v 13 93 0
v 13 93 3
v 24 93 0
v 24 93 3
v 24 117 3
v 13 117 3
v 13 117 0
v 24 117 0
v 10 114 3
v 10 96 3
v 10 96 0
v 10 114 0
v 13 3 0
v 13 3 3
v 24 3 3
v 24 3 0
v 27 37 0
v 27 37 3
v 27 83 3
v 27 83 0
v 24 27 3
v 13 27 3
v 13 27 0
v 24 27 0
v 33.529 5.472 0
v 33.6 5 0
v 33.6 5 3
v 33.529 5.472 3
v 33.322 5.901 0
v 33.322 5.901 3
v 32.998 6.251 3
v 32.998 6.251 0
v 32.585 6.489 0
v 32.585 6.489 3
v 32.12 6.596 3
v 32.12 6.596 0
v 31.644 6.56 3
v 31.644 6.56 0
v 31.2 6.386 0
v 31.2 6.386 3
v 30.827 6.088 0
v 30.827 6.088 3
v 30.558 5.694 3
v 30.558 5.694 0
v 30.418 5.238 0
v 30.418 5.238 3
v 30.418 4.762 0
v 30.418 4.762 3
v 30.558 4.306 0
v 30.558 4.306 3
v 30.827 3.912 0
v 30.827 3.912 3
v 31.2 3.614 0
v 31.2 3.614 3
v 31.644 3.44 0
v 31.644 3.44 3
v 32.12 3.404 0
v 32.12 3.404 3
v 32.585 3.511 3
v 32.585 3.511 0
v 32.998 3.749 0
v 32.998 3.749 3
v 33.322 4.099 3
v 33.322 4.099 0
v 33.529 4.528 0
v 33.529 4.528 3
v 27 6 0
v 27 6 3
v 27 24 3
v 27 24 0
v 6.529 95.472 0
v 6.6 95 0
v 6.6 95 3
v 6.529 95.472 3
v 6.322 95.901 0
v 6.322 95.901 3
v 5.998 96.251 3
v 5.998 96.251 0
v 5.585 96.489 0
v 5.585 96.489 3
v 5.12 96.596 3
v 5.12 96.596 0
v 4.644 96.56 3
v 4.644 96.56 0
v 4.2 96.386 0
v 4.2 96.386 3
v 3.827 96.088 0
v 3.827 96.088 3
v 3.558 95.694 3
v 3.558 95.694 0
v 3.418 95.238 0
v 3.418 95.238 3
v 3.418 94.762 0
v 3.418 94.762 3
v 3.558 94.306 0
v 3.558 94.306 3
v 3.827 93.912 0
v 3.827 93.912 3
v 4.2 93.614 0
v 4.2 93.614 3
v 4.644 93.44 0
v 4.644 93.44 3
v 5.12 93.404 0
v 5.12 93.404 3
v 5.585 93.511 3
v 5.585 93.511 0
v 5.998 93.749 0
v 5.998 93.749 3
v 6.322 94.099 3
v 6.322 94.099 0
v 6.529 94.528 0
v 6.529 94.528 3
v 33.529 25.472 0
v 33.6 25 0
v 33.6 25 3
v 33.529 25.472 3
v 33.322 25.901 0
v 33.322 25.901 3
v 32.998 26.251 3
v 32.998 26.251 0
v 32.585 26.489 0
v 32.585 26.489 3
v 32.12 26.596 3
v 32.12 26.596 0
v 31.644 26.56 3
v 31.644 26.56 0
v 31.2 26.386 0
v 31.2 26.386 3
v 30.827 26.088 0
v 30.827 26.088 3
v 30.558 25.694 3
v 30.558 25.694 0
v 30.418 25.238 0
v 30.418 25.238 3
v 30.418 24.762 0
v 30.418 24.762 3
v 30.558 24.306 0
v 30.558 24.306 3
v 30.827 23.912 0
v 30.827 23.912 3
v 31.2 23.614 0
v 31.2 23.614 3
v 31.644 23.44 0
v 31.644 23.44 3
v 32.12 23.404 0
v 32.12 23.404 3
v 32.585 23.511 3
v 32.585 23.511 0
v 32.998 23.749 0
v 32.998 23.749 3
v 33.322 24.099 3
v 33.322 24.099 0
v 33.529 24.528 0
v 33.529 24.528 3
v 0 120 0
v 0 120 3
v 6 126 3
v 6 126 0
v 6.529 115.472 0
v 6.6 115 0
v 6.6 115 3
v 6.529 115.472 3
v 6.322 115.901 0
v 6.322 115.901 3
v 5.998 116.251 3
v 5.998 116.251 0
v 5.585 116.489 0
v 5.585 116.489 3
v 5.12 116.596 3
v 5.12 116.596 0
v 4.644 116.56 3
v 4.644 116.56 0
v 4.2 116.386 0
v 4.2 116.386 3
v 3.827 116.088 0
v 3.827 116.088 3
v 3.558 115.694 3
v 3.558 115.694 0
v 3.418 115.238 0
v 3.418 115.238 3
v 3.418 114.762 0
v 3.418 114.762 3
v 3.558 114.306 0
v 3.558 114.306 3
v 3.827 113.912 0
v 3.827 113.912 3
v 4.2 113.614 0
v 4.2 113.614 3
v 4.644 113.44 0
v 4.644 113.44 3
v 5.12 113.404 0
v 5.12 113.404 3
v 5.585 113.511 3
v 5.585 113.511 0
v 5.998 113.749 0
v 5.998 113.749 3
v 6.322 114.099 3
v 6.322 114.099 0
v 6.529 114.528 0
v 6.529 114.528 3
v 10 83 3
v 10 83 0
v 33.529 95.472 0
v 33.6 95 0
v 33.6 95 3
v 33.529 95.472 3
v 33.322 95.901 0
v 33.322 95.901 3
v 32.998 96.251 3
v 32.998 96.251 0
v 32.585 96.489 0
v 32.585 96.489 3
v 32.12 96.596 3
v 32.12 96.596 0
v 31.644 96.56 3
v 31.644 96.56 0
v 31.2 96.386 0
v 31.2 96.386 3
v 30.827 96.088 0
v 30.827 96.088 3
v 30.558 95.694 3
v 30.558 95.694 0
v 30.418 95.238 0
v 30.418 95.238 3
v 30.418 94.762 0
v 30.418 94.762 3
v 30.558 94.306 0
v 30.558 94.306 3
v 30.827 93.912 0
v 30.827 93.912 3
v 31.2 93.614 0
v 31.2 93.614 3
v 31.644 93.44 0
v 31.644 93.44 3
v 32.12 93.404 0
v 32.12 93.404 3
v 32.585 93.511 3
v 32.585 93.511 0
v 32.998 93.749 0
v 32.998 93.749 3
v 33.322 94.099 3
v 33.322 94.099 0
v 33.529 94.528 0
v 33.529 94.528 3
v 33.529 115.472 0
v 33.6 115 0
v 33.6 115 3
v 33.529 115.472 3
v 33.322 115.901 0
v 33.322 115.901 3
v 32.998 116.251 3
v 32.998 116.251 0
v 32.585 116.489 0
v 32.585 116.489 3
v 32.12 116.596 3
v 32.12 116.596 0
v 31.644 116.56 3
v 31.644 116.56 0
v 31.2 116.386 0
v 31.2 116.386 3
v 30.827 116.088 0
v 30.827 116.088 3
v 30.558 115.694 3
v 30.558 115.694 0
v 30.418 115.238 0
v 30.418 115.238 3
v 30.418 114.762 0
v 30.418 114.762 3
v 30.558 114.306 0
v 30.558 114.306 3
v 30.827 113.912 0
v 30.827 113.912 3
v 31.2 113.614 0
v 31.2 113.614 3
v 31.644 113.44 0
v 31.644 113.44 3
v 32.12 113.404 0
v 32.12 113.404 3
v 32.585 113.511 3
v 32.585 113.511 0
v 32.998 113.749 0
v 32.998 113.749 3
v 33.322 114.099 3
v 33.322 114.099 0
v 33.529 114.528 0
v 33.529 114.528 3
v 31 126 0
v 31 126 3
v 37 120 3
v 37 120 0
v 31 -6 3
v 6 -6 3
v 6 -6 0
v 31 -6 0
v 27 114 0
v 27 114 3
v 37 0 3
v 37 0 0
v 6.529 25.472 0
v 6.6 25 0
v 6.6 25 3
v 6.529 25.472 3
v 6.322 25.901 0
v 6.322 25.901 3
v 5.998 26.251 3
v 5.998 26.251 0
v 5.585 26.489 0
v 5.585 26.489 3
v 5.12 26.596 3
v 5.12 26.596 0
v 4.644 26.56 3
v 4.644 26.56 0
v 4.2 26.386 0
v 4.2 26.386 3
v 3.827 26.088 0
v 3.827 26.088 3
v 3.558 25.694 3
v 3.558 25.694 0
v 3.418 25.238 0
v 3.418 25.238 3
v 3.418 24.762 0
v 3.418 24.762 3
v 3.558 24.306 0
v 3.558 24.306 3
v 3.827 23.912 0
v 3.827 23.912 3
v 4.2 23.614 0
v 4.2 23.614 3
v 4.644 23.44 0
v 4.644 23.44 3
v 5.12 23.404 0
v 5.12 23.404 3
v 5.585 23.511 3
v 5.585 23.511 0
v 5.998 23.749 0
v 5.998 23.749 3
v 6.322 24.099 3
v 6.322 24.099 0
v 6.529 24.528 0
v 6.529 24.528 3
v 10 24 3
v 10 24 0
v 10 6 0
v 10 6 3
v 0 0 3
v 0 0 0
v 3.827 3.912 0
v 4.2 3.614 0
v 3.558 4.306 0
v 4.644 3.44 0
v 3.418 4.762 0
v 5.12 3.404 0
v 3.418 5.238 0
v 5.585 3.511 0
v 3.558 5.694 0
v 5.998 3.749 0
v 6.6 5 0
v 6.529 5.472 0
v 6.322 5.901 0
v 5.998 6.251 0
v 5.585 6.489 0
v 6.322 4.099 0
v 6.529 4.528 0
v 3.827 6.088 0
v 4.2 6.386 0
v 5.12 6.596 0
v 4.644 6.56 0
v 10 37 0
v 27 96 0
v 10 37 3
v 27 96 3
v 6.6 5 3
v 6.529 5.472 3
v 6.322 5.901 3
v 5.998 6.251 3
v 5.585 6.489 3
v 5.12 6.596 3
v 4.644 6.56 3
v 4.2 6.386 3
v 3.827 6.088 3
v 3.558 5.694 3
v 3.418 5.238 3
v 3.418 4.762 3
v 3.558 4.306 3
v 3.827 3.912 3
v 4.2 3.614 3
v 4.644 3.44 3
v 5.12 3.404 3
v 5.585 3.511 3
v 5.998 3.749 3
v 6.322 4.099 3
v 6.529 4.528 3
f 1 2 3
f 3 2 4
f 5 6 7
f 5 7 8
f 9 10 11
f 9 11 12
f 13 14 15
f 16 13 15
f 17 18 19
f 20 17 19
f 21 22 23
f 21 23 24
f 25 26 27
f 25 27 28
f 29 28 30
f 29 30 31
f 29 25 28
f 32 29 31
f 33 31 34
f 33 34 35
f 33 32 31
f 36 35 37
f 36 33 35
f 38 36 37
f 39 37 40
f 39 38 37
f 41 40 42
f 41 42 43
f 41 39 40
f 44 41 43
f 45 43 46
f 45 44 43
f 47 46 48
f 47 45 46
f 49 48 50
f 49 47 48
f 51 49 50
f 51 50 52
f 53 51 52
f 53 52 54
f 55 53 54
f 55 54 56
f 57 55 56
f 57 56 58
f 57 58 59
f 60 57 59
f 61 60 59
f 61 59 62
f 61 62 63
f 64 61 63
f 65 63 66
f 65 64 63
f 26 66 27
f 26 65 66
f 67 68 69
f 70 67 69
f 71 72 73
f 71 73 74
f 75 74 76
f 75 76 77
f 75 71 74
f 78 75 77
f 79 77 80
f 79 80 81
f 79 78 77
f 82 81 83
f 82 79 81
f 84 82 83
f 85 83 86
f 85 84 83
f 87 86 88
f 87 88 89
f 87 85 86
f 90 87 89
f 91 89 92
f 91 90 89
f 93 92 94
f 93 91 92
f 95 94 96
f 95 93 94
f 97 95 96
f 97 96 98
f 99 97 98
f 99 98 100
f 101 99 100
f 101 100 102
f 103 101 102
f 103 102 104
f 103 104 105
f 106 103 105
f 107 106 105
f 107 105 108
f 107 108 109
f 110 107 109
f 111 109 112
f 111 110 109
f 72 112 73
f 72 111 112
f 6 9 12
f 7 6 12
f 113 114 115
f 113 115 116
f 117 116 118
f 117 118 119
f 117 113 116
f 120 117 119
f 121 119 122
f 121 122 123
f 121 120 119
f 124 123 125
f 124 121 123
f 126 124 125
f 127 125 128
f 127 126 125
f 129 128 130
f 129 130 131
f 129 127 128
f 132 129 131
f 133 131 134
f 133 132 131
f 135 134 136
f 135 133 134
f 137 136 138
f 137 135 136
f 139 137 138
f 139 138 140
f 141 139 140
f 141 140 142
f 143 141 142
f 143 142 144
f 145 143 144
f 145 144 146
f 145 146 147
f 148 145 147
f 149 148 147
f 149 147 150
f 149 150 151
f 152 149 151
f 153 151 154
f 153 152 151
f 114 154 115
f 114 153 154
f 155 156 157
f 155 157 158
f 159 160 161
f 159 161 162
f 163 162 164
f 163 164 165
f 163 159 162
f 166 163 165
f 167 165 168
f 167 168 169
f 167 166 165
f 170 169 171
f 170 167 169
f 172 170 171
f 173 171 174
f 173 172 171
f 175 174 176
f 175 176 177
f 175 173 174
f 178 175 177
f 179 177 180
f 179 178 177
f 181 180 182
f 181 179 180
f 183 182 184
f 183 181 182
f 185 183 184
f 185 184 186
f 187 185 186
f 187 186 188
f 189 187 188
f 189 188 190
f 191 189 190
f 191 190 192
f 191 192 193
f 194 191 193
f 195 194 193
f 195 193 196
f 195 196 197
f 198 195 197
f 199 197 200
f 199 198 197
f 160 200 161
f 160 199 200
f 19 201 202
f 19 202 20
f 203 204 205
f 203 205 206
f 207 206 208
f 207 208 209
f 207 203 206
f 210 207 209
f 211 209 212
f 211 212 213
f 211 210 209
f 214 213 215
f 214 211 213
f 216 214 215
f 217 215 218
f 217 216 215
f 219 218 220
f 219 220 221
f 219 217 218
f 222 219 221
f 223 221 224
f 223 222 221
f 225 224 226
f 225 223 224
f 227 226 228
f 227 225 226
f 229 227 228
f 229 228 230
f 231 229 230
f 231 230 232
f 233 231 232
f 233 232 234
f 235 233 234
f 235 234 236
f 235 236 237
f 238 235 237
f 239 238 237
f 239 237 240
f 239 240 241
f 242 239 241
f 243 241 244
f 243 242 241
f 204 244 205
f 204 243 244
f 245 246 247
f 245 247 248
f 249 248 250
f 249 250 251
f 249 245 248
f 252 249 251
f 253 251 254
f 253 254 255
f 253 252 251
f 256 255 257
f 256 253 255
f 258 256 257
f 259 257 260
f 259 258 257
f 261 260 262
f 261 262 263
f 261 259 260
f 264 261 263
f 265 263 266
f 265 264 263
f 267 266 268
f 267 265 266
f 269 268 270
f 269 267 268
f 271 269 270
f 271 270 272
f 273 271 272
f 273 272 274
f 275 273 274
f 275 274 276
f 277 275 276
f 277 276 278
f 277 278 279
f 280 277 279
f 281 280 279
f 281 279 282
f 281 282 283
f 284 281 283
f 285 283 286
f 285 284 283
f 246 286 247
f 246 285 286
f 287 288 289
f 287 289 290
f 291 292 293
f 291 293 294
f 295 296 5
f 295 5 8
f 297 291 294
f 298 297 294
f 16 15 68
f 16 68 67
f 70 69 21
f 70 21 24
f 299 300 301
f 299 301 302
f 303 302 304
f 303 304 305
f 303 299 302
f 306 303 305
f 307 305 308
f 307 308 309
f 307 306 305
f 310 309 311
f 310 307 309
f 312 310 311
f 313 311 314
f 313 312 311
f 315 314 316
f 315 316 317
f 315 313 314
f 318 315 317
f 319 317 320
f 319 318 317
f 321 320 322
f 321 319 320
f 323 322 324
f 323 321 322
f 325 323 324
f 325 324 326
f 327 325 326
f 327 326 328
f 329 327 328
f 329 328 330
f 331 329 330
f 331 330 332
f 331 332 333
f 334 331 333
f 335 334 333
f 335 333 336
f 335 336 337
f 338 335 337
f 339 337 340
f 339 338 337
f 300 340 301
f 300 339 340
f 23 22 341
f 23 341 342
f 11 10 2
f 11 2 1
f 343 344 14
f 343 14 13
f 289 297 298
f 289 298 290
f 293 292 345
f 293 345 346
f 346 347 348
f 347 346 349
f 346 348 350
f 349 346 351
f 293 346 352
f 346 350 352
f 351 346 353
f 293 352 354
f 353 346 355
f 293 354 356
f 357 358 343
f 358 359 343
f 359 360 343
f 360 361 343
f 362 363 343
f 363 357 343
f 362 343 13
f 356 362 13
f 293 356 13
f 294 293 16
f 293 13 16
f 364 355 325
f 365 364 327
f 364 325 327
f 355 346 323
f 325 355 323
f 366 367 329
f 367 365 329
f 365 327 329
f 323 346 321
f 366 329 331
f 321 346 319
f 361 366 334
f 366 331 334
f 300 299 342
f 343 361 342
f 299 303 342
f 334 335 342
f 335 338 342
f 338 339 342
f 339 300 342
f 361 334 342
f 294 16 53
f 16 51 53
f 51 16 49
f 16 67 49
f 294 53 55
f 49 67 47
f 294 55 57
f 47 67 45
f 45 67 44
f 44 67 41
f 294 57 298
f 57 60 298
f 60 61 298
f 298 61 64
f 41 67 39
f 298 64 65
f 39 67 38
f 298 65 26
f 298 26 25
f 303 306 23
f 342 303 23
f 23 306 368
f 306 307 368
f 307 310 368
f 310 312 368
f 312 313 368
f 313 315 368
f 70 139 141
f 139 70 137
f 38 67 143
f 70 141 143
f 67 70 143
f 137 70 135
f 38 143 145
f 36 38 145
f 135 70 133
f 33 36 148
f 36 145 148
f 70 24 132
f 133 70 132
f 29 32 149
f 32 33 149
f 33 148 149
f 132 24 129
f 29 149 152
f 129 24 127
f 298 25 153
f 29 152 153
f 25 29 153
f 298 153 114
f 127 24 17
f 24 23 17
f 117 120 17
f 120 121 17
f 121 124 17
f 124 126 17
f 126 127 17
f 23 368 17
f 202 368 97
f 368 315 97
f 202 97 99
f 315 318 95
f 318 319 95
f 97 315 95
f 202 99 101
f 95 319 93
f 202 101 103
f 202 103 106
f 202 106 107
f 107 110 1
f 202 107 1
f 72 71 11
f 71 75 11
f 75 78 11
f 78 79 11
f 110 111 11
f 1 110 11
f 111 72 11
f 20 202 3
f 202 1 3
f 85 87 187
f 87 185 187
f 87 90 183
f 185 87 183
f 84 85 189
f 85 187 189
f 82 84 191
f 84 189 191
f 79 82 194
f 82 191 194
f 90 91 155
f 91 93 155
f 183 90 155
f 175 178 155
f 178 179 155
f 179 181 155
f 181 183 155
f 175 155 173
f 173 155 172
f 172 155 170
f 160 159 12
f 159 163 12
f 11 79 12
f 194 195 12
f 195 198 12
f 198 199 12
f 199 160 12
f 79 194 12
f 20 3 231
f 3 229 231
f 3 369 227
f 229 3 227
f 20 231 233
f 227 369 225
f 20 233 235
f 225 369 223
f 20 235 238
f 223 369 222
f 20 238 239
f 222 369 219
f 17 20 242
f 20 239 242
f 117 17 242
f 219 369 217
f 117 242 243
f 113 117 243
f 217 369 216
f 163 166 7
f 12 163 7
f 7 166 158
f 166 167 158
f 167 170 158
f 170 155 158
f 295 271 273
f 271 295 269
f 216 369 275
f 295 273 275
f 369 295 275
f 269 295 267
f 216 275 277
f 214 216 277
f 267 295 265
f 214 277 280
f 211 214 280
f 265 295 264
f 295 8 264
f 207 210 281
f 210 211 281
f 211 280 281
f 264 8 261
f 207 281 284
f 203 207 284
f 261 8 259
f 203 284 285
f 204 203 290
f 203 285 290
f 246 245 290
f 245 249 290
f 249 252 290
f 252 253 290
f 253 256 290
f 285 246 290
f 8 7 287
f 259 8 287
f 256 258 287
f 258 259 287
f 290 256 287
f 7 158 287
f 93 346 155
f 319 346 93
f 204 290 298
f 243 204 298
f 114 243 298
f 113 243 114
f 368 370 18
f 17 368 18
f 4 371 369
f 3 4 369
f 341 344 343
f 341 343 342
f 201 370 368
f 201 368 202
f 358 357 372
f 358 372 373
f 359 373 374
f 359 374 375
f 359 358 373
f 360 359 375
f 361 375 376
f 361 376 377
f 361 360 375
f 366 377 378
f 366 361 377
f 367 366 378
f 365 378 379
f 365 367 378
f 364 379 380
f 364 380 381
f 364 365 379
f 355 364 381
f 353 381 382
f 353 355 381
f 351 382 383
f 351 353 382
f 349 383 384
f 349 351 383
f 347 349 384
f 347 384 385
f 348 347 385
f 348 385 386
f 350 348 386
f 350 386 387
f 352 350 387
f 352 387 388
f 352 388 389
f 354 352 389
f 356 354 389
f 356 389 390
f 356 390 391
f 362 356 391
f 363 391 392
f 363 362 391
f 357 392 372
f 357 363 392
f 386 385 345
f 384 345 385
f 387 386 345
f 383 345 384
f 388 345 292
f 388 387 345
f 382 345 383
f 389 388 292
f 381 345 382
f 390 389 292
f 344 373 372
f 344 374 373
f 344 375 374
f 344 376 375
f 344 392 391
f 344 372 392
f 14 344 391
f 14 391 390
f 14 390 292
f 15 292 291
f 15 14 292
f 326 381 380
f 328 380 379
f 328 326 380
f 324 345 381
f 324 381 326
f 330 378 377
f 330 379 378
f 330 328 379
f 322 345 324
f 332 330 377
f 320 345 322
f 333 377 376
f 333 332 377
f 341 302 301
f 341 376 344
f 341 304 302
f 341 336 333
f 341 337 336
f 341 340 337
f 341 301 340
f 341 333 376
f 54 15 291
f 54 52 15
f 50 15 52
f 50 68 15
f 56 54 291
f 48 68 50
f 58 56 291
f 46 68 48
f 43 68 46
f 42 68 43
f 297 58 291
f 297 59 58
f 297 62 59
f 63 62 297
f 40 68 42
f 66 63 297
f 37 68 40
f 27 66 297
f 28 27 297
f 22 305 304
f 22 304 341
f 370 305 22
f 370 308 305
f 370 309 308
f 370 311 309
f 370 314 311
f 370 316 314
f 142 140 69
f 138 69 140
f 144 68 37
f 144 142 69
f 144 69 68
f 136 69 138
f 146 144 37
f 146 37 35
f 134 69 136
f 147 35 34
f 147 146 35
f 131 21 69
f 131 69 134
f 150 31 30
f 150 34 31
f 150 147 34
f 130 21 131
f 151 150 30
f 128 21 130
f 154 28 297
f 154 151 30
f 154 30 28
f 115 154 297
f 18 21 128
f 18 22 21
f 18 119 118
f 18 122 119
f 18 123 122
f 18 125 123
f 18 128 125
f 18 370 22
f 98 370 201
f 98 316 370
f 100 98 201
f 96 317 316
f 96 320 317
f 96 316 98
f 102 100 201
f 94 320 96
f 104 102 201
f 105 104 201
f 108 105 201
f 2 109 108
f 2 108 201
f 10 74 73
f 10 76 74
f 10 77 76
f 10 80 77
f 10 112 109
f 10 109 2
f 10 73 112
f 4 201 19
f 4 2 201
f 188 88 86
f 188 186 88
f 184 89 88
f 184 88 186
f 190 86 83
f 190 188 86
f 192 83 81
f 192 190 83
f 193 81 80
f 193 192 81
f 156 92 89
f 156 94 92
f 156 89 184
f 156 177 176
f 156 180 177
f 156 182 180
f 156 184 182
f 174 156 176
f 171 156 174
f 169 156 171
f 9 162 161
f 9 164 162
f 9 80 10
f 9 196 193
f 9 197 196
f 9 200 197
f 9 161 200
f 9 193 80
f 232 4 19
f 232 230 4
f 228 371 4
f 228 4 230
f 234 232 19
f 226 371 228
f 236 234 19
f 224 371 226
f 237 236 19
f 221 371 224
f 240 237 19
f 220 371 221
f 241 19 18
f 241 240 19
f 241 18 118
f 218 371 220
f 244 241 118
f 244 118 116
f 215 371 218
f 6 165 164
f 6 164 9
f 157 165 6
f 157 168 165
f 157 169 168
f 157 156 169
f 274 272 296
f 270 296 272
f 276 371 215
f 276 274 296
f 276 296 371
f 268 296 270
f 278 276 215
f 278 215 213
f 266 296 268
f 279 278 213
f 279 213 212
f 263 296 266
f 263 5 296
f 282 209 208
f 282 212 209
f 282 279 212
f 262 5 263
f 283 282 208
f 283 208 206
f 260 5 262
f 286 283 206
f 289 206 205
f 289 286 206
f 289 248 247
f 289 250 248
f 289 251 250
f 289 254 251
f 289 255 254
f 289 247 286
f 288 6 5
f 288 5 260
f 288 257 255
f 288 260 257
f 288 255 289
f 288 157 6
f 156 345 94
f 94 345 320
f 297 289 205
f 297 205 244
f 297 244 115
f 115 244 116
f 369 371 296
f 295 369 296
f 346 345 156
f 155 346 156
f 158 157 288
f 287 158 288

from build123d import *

# Parameters (mm, degrees)
SKETCH_1_W          = 37
SKETCH_1_H          = 120
SKETCH_1_R          = 1.6
EXTRUDE_1_DEPTH     = 3
SKETCH_2_W          = 17
SKETCH_2_H          = 24
CUT_EXTRUDE_1_DEPTH = 126.610509114
SKETCH_3_W          = 37
SKETCH_3_H          = 6
EXTRUDE_2_DEPTH     = 3
CHAMFER_1_SIZE      = 6
CHAMFER_2_SIZE      = 3
SKETCH_4_W          = 17
SKETCH_4_H          = 46
CUT_EXTRUDE_2_DEPTH = 10


with BuildPart() as part:
    # ｽｹｯﾁ1 → ﾎﾞｽ - 押し出し1 (new body)
    with BuildSketch(Plane.XY):
        with Locations((18.5, 60)):
            Rectangle(SKETCH_1_W, SKETCH_1_H)
        with Locations((5, 115)):
            Circle(SKETCH_1_R, mode=Mode.SUBTRACT)
        with Locations((32, 115)):
            Circle(SKETCH_1_R, mode=Mode.SUBTRACT)
        with Locations((5, 95)):
            Circle(SKETCH_1_R, mode=Mode.SUBTRACT)
        with Locations((32, 95)):
            Circle(SKETCH_1_R, mode=Mode.SUBTRACT)
        with Locations((5, 25)):
            Circle(SKETCH_1_R, mode=Mode.SUBTRACT)
        with Locations((32, 25)):
            Circle(SKETCH_1_R, mode=Mode.SUBTRACT)
        with Locations((5, 5)):
            Circle(SKETCH_1_R, mode=Mode.SUBTRACT)
        with Locations((32, 5)):
            Circle(SKETCH_1_R, mode=Mode.SUBTRACT)
    extrude(amount=EXTRUDE_1_DEPTH)

    # ｽｹｯﾁ2 → ｶｯﾄ - 押し出し1 (cut, through all)
    with BuildSketch(Plane.XY.offset(3)):
        with Locations((18.5, 105)):
            Rectangle(SKETCH_2_W, SKETCH_2_H)
        with Locations((18.5, 15)):
            Rectangle(SKETCH_2_W, SKETCH_2_H)
    extrude(amount=-CUT_EXTRUDE_1_DEPTH, mode=Mode.SUBTRACT)

    # ｽｹｯﾁ3 → ﾎﾞｽ - 押し出し2 (add)
    with BuildSketch(Plane.XY.offset(3)):
        with Locations((18.5, 123)):
            Rectangle(SKETCH_3_W, SKETCH_3_H)
        with Locations((18.5, -3)):
            Rectangle(SKETCH_3_W, SKETCH_3_H)
    extrude(amount=-EXTRUDE_2_DEPTH)

    # 面取り1
    chamfer_1_edges = [part.edges().sort_by_distance(p)[0] for p in [
        (0, 126, 1.5),
        (37, 126, 1.5),
        (0, -6, 1.5),
        (37, -6, 1.5),
    ]]
    chamfer(chamfer_1_edges, length=CHAMFER_1_SIZE)

    # 面取り2
    chamfer_2_edges = [part.edges().sort_by_distance(p)[0] for p in [
        (10, 93, 1.5),
        (10, 117, 1.5),
        (27, 117, 1.5),
        (27, 93, 1.5),
        (10, 3, 1.5),
        (10, 27, 1.5),
        (27, 27, 1.5),
        (27, 3, 1.5),
    ]]
    chamfer(chamfer_2_edges, length=CHAMFER_2_SIZE)

    # ｽｹｯﾁ4 → ｶｯﾄ - 押し出し2 (cut)
    with BuildSketch(Plane.XY.offset(3)):
        with Locations((18.5, 60)):
            Rectangle(SKETCH_4_W, SKETCH_4_H)
    extrude(amount=-CUT_EXTRUDE_2_DEPTH, mode=Mode.SUBTRACT)


solid = part.part
